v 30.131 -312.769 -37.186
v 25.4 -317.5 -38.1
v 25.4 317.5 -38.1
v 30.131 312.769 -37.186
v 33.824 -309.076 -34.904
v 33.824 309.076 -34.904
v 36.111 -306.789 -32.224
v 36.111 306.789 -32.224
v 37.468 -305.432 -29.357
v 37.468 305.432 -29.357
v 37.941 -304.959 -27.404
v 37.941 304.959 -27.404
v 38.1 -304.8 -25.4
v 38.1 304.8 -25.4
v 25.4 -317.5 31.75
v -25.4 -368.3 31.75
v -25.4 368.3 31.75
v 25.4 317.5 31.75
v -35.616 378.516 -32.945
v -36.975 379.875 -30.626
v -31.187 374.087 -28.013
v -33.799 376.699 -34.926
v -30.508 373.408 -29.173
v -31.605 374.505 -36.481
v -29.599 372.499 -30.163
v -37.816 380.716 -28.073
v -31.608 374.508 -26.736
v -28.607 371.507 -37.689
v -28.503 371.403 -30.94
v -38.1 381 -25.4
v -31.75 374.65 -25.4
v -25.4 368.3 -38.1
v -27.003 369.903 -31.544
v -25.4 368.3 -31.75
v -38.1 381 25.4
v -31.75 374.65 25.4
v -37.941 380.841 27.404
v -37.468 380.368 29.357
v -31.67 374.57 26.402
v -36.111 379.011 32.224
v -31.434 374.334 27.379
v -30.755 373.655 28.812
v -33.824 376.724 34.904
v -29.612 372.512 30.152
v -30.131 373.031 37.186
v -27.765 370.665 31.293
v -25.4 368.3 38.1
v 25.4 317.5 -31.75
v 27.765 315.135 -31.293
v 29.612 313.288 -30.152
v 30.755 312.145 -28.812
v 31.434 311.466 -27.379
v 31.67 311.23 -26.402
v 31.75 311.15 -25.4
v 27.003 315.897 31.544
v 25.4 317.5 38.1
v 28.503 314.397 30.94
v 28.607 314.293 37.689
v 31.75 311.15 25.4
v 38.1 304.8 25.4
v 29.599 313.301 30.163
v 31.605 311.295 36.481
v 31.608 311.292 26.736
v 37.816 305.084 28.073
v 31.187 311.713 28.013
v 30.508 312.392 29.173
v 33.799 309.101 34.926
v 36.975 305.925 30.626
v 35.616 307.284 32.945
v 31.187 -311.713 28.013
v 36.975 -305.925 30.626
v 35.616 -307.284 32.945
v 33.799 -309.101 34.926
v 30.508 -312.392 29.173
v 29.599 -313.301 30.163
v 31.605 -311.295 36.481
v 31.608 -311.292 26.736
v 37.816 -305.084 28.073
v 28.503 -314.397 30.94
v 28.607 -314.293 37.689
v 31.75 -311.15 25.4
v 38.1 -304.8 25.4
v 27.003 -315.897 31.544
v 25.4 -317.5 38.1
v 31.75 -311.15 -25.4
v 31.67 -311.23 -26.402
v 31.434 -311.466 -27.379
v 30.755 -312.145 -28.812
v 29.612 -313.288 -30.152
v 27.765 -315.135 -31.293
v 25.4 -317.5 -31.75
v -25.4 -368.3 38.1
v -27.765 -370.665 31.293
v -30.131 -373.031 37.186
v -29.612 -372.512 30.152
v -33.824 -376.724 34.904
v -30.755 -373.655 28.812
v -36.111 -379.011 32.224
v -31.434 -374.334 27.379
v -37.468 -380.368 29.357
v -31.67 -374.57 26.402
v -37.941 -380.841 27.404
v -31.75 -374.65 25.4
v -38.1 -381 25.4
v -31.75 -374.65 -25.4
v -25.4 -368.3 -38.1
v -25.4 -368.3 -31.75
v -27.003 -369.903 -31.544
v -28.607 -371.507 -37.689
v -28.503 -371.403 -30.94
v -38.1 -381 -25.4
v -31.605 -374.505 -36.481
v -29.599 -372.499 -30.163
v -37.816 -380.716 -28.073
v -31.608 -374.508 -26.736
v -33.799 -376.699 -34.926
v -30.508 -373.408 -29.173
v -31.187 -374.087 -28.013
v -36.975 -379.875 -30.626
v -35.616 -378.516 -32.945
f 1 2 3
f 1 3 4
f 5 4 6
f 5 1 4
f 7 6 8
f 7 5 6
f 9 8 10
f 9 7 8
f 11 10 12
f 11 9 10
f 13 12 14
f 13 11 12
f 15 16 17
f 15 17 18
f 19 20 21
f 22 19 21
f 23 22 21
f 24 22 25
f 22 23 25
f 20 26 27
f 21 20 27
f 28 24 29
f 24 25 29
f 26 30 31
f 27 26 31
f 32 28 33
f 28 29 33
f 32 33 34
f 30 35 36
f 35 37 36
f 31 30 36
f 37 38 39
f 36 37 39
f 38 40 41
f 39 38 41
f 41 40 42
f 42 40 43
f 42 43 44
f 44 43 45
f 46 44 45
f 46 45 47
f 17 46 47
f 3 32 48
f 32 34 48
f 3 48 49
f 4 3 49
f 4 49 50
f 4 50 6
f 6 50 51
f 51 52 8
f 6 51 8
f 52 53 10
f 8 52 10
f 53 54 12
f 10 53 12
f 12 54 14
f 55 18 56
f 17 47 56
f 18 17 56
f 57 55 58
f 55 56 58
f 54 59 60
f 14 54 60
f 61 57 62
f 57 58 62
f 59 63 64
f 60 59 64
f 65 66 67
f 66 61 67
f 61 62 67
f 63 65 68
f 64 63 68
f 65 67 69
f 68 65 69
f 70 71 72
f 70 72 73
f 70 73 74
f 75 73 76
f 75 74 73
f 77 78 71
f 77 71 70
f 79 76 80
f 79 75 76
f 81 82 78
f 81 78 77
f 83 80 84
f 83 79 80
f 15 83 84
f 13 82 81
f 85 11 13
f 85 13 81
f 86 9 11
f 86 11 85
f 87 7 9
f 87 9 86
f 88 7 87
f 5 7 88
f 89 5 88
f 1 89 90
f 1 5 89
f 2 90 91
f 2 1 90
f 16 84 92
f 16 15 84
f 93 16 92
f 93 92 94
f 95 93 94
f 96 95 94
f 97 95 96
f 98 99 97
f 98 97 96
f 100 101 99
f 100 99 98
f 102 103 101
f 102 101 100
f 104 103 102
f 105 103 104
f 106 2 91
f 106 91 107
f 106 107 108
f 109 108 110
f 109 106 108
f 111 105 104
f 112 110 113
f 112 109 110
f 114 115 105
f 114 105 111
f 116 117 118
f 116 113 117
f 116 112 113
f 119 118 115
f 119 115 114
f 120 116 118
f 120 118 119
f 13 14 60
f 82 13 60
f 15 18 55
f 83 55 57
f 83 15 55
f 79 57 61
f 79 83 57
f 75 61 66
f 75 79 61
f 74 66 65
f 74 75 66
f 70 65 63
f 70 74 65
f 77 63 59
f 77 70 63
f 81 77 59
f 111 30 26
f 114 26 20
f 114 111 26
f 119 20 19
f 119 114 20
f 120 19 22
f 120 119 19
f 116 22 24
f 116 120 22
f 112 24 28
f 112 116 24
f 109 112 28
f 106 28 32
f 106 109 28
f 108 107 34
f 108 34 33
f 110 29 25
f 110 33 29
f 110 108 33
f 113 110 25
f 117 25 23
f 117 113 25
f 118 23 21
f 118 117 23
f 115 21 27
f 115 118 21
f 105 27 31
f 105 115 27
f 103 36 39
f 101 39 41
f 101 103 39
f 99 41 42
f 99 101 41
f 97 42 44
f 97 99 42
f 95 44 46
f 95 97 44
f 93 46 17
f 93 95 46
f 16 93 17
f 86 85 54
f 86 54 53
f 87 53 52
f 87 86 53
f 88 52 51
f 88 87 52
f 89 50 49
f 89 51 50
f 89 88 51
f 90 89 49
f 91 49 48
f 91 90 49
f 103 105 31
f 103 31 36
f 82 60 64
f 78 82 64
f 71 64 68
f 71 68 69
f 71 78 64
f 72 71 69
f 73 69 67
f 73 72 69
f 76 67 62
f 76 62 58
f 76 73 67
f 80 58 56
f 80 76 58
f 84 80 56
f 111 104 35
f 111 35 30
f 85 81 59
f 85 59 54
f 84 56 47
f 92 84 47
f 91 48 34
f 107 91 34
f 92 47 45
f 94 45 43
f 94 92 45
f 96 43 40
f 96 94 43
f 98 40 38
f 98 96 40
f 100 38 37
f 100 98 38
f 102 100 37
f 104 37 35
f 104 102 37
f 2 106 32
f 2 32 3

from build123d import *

# Parameters (mm, degrees)
F1_DEPTH = 381
F3_DEPTH = 50.8


with BuildPart() as f1:
    # F0 (on Front) → F1 (new body, symmetric)
    with BuildSketch(Plane.XZ):
        with BuildLine():
            ThreePointArc((38.1, 25.4), (34.3802561211, 34.3802561211), (25.4, 38.1))
            Line((25.4, 38.1), (-25.4, 38.1))
            ThreePointArc((-25.4, 38.1), (-34.3802561211, 34.3802561211), (-38.1, 25.4))
            Line((-38.1, 25.4), (-38.1, -25.4))
            ThreePointArc((-38.1, -25.4), (-34.3802561211, -34.3802561211), (-25.4, -38.1))
            Line((-25.4, -38.1), (25.4, -38.1))
            ThreePointArc((25.4, -38.1), (34.3802561211, -34.3802561211), (38.1, -25.4))
            Line((38.1, -25.4), (38.1, 25.4))
        make_face()
        with BuildLine():
            ThreePointArc((25.4, 31.7500010133), (29.890128777, 29.890128777), (31.7500010133, 25.4))
            Line((31.7500010133, 25.4), (31.7500010133, -25.4))
            ThreePointArc((31.7500010133, -25.4), (29.890128777, -29.890128777), (25.4, -31.7500010133))
            Line((25.4, -31.7500010133), (-25.4, -31.7500010133))
            ThreePointArc((-25.4, -31.7500010133), (-29.890128777, -29.890128777), (-31.7500010133, -25.4))
            Line((-31.7500010133, -25.4), (-31.7500010133, 25.4))
            ThreePointArc((-31.7500010133, 25.4), (-29.890128777, 29.890128777), (-25.4, 31.7500010133))
            Line((-25.4, 31.7500010133), (25.4, 31.7500010133))
        make_face(mode=Mode.SUBTRACT)
    extrude(amount=F1_DEPTH, both=True)

    # F2 (on Top) → F3 (cut, symmetric)
    with BuildSketch(Plane.XY):
        Polygon((38.1, -304.8), (-38.1, -381), (38.1, -381), align=None)
        Polygon((38.1, 381), (-38.1, 381), (38.1, 304.8), align=None)
    extrude(amount=F3_DEPTH, both=True, mode=Mode.SUBTRACT)


solid = f1.part
